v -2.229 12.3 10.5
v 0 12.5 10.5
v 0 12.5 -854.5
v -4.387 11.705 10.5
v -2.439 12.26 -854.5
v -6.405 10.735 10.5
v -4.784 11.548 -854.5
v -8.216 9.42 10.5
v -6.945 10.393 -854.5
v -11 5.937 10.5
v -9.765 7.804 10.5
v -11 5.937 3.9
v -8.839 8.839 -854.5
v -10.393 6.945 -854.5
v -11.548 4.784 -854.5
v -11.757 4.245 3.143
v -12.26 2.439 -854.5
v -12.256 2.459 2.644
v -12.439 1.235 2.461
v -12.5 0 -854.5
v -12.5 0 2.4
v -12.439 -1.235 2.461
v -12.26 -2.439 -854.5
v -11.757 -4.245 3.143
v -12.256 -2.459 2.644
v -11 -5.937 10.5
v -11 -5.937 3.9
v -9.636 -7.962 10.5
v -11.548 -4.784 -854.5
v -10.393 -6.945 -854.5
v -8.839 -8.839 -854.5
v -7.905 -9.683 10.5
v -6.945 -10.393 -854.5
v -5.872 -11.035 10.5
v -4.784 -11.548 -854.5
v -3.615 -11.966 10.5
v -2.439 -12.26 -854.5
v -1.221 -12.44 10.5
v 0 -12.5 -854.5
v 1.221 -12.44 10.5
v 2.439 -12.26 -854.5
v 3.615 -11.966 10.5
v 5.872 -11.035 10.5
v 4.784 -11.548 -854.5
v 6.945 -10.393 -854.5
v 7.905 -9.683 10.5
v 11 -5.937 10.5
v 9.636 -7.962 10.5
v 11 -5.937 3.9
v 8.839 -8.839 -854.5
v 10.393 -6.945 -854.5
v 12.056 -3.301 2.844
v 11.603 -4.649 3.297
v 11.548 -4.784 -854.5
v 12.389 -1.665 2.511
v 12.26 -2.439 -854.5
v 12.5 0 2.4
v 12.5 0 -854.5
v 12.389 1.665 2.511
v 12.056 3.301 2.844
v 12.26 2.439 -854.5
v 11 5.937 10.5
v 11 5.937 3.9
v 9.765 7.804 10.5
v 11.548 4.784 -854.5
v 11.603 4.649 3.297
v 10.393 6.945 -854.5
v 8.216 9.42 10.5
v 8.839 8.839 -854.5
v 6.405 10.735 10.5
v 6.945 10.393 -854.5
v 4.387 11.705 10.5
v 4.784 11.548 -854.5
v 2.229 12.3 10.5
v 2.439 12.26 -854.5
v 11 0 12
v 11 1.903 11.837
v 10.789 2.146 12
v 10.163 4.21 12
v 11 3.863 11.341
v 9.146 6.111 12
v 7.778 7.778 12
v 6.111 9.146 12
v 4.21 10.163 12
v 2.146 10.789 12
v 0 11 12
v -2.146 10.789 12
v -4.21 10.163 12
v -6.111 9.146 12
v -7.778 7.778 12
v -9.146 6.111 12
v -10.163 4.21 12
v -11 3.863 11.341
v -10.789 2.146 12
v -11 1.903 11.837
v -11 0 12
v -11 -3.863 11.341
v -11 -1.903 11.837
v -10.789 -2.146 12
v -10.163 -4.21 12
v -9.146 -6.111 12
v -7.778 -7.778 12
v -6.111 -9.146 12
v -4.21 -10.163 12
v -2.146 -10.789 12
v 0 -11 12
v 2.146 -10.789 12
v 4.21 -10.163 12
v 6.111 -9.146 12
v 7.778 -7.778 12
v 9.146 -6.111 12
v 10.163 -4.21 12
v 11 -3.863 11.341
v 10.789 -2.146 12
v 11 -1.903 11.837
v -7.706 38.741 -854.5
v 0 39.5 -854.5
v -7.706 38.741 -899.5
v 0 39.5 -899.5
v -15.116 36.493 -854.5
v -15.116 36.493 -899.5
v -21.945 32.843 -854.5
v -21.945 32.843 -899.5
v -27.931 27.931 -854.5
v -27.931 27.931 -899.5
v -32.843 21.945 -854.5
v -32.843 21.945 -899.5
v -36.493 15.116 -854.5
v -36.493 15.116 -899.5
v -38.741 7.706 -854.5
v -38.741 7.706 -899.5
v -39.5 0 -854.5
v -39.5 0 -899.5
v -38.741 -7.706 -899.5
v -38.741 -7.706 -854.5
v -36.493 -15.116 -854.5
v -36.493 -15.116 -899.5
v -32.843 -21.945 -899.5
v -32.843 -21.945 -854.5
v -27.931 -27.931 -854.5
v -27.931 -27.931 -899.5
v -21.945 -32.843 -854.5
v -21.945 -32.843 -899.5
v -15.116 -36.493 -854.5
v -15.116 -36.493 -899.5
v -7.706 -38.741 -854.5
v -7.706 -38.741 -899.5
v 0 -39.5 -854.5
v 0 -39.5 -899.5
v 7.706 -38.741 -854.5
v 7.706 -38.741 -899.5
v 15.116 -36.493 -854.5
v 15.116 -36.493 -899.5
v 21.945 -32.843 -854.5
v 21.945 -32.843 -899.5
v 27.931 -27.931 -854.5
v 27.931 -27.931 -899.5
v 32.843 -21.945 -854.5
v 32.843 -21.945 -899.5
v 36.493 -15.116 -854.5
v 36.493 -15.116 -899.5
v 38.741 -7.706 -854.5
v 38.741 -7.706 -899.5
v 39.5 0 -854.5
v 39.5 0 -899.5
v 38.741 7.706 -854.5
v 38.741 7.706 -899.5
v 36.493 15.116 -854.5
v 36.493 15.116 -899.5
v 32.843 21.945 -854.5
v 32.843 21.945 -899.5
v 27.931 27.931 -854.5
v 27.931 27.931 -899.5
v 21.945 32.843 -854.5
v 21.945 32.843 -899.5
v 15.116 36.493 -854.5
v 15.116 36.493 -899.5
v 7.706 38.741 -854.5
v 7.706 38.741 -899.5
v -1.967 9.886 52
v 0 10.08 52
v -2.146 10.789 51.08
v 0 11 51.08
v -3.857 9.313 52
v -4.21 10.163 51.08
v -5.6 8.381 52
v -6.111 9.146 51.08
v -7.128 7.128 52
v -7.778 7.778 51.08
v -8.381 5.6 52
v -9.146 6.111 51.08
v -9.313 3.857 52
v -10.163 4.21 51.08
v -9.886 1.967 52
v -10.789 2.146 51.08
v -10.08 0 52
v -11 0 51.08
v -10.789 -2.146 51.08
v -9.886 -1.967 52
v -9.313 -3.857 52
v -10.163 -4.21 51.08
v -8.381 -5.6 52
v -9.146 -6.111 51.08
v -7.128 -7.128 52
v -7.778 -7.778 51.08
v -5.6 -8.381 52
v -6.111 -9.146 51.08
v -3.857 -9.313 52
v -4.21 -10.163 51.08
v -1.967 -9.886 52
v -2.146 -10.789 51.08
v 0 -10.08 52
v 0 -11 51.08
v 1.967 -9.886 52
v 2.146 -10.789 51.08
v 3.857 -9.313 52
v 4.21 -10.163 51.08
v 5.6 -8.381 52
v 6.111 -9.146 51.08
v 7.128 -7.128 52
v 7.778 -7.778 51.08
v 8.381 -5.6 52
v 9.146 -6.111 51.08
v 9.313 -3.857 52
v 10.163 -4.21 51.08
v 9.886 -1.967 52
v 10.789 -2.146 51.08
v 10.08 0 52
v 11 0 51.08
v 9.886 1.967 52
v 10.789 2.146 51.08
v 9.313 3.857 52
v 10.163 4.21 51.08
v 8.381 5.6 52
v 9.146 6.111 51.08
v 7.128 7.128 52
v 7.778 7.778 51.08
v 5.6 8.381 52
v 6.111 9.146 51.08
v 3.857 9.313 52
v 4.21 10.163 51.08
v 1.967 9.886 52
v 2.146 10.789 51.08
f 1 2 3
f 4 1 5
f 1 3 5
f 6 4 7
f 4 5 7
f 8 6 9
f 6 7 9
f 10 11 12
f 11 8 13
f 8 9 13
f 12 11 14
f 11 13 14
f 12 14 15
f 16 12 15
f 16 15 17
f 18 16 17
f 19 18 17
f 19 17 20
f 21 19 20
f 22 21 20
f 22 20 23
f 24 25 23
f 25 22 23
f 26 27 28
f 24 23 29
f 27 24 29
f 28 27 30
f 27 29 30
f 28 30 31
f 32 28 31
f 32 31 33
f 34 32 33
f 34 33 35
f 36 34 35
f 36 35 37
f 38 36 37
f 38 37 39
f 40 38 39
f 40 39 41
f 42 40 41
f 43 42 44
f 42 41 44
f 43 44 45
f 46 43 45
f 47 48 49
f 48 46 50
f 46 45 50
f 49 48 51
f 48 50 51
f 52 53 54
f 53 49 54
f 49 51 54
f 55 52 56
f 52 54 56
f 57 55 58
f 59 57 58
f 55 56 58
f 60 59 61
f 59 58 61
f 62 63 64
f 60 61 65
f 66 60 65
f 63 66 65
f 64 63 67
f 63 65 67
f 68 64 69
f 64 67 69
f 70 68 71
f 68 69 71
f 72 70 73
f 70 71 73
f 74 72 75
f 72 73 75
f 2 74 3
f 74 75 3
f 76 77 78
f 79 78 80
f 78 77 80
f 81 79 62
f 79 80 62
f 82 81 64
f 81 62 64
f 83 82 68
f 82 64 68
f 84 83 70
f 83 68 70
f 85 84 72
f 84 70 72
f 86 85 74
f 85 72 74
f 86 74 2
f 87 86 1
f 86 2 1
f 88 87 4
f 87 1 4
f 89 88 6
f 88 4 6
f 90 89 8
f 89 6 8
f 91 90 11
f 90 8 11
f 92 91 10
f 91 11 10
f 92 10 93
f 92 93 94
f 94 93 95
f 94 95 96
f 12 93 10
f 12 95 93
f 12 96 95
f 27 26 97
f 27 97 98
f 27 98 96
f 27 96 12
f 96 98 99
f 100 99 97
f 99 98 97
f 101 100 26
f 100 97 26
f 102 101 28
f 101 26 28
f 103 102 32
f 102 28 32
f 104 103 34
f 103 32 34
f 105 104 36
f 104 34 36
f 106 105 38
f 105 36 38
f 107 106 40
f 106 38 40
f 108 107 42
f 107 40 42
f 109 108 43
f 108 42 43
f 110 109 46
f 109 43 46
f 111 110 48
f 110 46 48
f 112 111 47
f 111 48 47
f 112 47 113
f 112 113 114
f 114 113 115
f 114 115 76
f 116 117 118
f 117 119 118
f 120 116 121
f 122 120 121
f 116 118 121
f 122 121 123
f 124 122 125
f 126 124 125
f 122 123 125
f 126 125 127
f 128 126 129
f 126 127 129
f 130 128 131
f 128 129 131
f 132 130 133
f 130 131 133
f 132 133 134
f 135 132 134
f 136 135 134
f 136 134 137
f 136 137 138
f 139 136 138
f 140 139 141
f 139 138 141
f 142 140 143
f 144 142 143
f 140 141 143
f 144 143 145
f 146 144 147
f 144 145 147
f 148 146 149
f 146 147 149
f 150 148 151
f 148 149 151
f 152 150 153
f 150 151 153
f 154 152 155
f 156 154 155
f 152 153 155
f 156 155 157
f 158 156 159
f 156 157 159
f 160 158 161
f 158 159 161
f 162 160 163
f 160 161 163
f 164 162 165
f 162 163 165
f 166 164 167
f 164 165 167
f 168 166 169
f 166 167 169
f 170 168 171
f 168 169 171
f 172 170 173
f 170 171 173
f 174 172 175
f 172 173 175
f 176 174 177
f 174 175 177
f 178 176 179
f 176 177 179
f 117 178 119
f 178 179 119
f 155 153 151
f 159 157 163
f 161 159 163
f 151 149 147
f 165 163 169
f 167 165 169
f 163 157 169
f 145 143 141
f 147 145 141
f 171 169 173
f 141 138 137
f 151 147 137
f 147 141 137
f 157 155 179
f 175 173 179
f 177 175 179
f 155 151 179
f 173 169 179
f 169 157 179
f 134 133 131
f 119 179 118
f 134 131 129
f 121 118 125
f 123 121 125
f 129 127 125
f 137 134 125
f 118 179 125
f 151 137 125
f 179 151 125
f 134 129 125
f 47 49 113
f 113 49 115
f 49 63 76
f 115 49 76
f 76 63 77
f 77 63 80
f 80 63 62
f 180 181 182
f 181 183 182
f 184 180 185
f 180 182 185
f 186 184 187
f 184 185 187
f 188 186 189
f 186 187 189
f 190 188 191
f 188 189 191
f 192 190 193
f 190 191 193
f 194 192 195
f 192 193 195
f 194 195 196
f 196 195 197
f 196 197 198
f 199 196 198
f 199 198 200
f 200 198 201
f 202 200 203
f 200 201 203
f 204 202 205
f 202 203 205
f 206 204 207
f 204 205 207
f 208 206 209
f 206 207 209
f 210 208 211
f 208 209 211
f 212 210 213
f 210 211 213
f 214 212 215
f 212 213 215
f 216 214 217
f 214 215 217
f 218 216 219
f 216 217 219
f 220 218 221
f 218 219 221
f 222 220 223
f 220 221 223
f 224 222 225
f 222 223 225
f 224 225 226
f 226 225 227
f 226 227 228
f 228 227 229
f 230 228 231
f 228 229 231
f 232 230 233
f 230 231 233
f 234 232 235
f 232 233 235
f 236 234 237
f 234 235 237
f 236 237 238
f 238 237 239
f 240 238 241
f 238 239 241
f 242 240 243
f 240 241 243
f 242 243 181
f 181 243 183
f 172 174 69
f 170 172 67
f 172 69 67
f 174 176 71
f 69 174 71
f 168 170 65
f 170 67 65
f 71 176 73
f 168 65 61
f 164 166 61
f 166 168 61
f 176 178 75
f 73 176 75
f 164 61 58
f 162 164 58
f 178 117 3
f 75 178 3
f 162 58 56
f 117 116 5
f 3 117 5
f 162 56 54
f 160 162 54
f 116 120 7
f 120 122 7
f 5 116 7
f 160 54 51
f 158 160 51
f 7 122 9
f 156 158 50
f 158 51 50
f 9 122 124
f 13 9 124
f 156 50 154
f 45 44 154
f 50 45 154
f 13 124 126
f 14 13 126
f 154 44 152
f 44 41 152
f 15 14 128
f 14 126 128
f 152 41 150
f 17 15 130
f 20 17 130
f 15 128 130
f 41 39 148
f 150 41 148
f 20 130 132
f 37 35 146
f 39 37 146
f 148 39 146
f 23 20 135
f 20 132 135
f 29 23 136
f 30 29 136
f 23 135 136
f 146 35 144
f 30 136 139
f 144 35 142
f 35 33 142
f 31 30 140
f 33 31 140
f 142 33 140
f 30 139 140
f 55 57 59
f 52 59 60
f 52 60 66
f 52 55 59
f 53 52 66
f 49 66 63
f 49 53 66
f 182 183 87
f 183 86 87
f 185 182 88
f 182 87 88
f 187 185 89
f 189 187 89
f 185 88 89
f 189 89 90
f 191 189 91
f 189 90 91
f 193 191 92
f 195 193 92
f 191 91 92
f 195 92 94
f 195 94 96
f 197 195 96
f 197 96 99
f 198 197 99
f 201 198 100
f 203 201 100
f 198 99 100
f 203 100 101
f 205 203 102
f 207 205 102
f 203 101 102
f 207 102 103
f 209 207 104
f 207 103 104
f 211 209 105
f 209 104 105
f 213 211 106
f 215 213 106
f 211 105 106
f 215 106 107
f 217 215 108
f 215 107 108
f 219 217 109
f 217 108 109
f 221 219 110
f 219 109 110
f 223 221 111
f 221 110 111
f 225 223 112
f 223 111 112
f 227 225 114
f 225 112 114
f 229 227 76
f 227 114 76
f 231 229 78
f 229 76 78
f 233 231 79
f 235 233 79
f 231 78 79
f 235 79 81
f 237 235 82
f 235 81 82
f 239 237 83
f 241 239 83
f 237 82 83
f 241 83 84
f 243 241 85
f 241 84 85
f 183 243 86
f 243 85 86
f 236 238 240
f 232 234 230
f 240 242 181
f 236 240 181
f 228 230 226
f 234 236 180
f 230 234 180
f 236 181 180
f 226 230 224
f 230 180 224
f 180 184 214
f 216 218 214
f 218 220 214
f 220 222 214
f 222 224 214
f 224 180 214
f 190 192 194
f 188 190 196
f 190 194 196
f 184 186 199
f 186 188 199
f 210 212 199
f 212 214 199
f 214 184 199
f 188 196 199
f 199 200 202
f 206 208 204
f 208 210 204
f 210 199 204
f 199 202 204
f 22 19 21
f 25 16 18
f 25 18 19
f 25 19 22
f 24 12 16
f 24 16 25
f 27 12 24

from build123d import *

# Parameters (mm, degrees)
CUT_EXTRUDE_1_DEPTH      = 12.5
CUT_EXTRUDE_1_DEPTH_BACK = 12.5
CUT_EXTRUDE_2_DEPTH      = 12.5
CUT_EXTRUDE_2_DEPTH_BACK = 12.5


with BuildPart() as part:
    # 草图1 → 旋转1 (revolve)
    with BuildSketch(Plane(origin=(0, 0, 0), x_dir=(0, 0, -1), z_dir=(1, 0, 0))):
        Polygon((-52, 0), (-52, 10.08), (-51.08, 11), (-12, 11), (-10.5, 12.5), (854.5, 12.5), (854.5, 39.5), (899.5, 39.5), (899.5, 0), align=None)
    revolve(axis=Axis((0, 0, -899.5), (0, 0, 1)))

    # 草图2 → 切除-拉伸1 (cut, two sides: drawn at the far end of the back side and taken through both)
    with BuildSketch(Plane(origin=(0, 0, 0), x_dir=(1, 0, 0), z_dir=(0, 1, 0)).offset(-CUT_EXTRUDE_1_DEPTH_BACK)):
        Polygon((11, -3.9), (11, -12), (12.5, -12), (12.5, -2.4), align=None)
    extrude(amount=CUT_EXTRUDE_1_DEPTH + CUT_EXTRUDE_1_DEPTH_BACK, mode=Mode.SUBTRACT)

    # 草图3 → 切除-拉伸2 (cut, two sides: drawn at the far end of the back side and taken through both)
    with BuildSketch(Plane(origin=(0, 0, 0), x_dir=(1, 0, 0), z_dir=(0, 1, 0)).offset(-CUT_EXTRUDE_2_DEPTH_BACK)):
        Polygon((-12.5, -2.4), (-12.5, -12), (-11, -12), (-11, -3.9), align=None)
    extrude(amount=CUT_EXTRUDE_2_DEPTH + CUT_EXTRUDE_2_DEPTH_BACK, mode=Mode.SUBTRACT)


solid = part.part
